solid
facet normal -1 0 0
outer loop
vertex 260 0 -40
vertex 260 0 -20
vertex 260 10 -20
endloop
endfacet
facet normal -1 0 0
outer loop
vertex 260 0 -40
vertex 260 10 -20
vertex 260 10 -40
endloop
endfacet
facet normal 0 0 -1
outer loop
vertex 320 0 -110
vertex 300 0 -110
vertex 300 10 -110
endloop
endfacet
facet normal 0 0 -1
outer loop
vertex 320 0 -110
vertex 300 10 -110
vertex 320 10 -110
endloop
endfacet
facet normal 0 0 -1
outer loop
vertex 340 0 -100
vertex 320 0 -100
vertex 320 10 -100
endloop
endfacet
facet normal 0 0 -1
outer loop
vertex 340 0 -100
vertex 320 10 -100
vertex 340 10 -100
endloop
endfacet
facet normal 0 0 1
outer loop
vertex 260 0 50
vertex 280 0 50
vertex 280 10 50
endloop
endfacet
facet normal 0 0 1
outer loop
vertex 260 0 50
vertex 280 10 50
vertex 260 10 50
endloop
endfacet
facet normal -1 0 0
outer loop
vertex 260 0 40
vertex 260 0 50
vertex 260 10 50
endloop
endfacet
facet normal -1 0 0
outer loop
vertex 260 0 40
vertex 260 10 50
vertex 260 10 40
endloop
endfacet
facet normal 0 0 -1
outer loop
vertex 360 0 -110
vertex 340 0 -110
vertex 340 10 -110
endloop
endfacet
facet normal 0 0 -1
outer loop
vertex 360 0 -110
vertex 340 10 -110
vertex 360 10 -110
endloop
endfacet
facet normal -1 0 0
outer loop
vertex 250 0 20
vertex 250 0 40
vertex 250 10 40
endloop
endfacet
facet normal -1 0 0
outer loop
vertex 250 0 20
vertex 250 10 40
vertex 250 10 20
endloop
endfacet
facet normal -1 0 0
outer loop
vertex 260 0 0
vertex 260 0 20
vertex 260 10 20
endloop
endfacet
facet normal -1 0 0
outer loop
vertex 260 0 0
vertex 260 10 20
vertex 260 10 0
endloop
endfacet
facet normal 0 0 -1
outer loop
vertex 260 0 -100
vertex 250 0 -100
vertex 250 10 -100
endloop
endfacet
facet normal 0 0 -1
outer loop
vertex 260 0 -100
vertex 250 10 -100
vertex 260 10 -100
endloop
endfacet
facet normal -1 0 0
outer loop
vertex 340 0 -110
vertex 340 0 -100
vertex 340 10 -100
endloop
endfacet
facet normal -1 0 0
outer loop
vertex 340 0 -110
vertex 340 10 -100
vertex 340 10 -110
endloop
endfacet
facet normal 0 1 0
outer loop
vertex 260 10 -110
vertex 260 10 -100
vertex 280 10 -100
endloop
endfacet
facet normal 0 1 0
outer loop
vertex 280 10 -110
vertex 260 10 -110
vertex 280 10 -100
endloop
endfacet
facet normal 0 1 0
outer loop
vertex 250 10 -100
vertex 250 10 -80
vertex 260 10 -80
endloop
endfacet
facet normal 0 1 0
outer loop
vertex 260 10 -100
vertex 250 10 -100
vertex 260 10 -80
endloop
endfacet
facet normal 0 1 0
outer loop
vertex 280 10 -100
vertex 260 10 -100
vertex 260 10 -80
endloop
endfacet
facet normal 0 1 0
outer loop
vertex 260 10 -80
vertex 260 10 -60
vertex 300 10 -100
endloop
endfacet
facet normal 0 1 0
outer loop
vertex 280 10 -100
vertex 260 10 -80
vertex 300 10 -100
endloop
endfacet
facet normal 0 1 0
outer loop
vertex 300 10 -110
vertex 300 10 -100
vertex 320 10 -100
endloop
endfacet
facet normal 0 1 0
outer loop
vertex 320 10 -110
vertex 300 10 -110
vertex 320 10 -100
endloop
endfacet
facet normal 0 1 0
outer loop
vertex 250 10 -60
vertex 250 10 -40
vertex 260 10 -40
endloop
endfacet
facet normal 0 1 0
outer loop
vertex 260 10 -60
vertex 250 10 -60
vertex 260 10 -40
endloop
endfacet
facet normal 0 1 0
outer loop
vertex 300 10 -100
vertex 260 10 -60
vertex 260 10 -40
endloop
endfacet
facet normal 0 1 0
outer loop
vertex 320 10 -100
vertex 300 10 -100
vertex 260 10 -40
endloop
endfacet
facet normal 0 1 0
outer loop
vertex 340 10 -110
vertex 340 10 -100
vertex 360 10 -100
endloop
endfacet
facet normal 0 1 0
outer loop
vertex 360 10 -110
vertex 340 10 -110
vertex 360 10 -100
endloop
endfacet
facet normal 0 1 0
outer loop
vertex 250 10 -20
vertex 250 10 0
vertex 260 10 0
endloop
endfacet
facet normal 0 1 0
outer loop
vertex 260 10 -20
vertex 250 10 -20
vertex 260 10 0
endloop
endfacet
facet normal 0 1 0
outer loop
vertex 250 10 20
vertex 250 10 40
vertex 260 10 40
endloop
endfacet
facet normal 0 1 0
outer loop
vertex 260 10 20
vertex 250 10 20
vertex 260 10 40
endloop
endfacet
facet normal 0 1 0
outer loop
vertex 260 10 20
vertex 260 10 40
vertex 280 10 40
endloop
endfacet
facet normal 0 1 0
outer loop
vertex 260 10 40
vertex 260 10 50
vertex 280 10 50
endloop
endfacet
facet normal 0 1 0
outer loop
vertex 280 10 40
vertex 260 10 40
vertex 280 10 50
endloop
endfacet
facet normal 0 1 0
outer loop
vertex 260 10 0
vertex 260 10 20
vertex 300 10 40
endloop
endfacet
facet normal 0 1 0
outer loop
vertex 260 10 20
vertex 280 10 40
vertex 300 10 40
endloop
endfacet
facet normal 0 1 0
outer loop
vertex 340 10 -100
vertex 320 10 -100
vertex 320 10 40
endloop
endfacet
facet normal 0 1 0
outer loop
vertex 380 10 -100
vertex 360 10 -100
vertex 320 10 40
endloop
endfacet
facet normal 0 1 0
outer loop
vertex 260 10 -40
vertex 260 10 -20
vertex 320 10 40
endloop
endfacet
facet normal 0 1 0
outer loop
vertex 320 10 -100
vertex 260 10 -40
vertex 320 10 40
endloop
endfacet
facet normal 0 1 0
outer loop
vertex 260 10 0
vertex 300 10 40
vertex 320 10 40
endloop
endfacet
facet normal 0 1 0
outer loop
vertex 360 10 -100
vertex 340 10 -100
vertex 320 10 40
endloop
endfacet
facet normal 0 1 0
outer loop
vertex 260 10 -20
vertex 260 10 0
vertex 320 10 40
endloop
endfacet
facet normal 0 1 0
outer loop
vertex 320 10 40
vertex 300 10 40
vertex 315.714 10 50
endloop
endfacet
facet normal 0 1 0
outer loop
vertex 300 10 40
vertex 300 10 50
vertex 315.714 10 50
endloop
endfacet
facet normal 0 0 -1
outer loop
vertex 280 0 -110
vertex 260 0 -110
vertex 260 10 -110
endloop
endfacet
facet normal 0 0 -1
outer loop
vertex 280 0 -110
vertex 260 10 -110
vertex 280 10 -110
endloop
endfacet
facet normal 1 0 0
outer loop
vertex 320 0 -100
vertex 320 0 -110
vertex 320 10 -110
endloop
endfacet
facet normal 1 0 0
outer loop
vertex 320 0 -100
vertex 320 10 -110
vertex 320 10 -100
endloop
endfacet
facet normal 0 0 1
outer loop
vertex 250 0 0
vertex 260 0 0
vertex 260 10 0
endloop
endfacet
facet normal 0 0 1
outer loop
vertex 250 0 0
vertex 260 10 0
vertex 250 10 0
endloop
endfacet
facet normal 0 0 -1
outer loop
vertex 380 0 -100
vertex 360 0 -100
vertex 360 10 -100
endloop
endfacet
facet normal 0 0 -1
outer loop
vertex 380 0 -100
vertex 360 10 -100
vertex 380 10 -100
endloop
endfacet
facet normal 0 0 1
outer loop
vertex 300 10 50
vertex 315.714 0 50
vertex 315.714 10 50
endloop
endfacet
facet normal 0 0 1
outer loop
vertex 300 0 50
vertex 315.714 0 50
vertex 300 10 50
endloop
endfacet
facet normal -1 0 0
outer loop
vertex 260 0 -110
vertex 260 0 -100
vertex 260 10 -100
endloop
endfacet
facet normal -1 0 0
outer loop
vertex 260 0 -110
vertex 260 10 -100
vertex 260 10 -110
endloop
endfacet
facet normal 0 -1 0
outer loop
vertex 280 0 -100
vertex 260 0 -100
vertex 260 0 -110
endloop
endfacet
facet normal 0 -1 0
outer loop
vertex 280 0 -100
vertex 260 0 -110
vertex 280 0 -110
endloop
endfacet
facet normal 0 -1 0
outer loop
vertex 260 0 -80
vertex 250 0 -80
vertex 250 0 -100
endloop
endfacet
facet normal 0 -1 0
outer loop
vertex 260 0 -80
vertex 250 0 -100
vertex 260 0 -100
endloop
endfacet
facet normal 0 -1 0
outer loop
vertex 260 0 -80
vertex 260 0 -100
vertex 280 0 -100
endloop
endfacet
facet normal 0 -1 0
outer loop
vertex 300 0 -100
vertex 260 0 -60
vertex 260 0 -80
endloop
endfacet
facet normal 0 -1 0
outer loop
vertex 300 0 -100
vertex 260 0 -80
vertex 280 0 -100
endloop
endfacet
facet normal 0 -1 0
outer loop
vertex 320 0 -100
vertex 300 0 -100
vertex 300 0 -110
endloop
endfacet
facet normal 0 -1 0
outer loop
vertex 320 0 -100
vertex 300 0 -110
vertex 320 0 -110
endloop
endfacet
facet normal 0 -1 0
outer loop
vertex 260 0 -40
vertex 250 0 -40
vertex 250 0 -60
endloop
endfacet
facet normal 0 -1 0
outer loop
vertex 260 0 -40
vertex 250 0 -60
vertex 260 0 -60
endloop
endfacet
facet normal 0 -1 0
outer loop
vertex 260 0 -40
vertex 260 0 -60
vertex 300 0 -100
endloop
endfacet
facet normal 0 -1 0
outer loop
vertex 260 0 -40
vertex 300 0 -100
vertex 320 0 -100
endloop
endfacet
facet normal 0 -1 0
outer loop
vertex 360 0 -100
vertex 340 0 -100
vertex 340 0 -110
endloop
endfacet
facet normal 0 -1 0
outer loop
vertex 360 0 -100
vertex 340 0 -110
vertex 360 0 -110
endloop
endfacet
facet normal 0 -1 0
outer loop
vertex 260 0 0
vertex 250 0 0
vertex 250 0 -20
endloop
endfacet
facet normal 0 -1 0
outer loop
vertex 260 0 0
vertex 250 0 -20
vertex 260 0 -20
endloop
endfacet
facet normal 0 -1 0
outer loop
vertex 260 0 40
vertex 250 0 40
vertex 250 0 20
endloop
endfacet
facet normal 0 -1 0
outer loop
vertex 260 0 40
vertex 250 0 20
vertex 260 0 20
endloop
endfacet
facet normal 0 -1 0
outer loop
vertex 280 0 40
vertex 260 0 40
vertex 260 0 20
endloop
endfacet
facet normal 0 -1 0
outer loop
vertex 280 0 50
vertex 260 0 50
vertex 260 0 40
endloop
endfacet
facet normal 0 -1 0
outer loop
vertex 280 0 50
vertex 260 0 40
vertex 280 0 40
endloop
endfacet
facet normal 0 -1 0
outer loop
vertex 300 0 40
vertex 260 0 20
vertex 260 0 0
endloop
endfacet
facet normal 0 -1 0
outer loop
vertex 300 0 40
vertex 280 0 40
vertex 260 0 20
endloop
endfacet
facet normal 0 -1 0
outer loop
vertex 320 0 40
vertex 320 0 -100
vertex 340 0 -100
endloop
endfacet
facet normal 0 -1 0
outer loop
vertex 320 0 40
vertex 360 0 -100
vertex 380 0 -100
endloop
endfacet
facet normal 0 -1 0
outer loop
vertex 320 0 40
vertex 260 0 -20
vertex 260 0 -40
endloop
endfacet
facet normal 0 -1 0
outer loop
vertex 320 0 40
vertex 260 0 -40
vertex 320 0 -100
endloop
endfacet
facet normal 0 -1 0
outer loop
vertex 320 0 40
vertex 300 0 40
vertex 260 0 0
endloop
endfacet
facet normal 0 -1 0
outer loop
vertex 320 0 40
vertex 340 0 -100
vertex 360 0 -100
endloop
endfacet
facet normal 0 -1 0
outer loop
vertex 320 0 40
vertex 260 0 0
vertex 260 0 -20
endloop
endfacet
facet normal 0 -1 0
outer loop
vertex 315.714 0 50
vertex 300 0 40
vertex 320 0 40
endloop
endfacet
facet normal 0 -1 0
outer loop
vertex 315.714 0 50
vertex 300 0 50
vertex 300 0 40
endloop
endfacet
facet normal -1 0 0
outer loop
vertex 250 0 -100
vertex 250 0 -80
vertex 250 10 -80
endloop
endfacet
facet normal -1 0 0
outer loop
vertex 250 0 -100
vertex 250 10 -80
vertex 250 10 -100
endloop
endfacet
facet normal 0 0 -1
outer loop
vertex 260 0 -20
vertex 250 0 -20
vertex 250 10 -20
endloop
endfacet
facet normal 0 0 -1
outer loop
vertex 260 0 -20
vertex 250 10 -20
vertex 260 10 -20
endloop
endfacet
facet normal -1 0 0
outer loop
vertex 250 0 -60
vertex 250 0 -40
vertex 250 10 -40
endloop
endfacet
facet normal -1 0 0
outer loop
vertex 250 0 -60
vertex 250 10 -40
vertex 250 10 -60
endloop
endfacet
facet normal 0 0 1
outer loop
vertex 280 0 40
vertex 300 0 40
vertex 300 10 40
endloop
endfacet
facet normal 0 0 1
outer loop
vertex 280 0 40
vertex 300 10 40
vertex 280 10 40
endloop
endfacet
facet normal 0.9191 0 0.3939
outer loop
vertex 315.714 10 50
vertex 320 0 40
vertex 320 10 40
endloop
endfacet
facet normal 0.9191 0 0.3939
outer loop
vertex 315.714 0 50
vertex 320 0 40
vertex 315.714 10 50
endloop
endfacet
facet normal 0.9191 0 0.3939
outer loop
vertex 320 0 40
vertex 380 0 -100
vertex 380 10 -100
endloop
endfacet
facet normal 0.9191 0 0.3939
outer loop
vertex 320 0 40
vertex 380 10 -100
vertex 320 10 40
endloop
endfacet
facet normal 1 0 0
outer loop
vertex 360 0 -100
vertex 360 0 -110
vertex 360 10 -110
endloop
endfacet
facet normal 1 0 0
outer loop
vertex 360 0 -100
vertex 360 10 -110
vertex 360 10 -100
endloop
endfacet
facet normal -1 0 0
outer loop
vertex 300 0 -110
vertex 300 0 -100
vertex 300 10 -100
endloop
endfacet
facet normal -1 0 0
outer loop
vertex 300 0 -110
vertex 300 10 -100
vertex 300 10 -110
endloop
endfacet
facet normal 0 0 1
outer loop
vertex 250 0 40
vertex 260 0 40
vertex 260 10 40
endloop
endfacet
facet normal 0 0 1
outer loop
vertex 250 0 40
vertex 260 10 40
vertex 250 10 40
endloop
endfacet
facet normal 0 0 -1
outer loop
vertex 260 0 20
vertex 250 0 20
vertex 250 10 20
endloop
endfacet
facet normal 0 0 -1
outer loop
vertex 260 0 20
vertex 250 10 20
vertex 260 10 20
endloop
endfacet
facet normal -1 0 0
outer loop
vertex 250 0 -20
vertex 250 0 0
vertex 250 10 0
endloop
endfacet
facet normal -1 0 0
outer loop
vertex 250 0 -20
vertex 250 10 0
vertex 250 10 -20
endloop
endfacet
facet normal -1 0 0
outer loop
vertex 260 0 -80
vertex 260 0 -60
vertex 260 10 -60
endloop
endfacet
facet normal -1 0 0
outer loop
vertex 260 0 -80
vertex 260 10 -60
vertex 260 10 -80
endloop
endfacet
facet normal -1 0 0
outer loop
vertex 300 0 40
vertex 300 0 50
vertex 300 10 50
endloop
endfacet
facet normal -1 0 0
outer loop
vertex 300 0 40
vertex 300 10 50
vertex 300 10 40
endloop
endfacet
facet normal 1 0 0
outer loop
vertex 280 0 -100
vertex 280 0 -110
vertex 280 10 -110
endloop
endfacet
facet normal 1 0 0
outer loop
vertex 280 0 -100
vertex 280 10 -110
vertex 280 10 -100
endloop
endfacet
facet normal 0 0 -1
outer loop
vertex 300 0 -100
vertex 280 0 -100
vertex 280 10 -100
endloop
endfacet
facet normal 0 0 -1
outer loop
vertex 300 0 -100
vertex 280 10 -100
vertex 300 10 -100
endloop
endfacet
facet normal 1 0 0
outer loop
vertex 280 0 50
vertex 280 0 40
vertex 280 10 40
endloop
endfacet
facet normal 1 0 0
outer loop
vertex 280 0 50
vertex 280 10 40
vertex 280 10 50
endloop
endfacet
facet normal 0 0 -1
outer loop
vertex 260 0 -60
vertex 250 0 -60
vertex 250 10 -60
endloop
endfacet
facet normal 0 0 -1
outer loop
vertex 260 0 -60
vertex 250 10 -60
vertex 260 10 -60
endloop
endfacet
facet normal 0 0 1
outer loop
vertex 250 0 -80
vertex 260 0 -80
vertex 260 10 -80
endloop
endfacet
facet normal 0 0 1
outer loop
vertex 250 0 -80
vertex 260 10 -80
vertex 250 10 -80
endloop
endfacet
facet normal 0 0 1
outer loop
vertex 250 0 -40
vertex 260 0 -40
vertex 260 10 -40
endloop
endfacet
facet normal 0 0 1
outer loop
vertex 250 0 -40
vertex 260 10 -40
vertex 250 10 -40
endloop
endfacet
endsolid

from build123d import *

# Parameters (mm, degrees)
F1_DEPTH = 10


# Not quite as in the source:
# - a feature names something its author has since deleted; it is built from what else it names


with BuildPart() as f1:
    # F0 (on Front) → F1 (new body)
    with BuildSketch(Plane.XZ):
        Polygon((260, -100), (260, -110), (280, -110), (280, -100), (300, -100), (300, -110), (320, -110), (320, -100), (340, -100), (340, -110), (360, -110), (360, -100), (380, -100), (320, 40), (315.7142857143, 50), (300, 50), (300, 40), (280, 40), (280, 50), (260, 50), (260, 40), (250, 40), (250, 20), (260, 20), (260, 0), (250, 0), (250, -20), (260, -20), (260, -40), (250, -40), (250, -60), (260, -60), (260, -80), (250, -80), (250, -100), align=None)
    extrude(amount=-F1_DEPTH)


solid = f1.part
